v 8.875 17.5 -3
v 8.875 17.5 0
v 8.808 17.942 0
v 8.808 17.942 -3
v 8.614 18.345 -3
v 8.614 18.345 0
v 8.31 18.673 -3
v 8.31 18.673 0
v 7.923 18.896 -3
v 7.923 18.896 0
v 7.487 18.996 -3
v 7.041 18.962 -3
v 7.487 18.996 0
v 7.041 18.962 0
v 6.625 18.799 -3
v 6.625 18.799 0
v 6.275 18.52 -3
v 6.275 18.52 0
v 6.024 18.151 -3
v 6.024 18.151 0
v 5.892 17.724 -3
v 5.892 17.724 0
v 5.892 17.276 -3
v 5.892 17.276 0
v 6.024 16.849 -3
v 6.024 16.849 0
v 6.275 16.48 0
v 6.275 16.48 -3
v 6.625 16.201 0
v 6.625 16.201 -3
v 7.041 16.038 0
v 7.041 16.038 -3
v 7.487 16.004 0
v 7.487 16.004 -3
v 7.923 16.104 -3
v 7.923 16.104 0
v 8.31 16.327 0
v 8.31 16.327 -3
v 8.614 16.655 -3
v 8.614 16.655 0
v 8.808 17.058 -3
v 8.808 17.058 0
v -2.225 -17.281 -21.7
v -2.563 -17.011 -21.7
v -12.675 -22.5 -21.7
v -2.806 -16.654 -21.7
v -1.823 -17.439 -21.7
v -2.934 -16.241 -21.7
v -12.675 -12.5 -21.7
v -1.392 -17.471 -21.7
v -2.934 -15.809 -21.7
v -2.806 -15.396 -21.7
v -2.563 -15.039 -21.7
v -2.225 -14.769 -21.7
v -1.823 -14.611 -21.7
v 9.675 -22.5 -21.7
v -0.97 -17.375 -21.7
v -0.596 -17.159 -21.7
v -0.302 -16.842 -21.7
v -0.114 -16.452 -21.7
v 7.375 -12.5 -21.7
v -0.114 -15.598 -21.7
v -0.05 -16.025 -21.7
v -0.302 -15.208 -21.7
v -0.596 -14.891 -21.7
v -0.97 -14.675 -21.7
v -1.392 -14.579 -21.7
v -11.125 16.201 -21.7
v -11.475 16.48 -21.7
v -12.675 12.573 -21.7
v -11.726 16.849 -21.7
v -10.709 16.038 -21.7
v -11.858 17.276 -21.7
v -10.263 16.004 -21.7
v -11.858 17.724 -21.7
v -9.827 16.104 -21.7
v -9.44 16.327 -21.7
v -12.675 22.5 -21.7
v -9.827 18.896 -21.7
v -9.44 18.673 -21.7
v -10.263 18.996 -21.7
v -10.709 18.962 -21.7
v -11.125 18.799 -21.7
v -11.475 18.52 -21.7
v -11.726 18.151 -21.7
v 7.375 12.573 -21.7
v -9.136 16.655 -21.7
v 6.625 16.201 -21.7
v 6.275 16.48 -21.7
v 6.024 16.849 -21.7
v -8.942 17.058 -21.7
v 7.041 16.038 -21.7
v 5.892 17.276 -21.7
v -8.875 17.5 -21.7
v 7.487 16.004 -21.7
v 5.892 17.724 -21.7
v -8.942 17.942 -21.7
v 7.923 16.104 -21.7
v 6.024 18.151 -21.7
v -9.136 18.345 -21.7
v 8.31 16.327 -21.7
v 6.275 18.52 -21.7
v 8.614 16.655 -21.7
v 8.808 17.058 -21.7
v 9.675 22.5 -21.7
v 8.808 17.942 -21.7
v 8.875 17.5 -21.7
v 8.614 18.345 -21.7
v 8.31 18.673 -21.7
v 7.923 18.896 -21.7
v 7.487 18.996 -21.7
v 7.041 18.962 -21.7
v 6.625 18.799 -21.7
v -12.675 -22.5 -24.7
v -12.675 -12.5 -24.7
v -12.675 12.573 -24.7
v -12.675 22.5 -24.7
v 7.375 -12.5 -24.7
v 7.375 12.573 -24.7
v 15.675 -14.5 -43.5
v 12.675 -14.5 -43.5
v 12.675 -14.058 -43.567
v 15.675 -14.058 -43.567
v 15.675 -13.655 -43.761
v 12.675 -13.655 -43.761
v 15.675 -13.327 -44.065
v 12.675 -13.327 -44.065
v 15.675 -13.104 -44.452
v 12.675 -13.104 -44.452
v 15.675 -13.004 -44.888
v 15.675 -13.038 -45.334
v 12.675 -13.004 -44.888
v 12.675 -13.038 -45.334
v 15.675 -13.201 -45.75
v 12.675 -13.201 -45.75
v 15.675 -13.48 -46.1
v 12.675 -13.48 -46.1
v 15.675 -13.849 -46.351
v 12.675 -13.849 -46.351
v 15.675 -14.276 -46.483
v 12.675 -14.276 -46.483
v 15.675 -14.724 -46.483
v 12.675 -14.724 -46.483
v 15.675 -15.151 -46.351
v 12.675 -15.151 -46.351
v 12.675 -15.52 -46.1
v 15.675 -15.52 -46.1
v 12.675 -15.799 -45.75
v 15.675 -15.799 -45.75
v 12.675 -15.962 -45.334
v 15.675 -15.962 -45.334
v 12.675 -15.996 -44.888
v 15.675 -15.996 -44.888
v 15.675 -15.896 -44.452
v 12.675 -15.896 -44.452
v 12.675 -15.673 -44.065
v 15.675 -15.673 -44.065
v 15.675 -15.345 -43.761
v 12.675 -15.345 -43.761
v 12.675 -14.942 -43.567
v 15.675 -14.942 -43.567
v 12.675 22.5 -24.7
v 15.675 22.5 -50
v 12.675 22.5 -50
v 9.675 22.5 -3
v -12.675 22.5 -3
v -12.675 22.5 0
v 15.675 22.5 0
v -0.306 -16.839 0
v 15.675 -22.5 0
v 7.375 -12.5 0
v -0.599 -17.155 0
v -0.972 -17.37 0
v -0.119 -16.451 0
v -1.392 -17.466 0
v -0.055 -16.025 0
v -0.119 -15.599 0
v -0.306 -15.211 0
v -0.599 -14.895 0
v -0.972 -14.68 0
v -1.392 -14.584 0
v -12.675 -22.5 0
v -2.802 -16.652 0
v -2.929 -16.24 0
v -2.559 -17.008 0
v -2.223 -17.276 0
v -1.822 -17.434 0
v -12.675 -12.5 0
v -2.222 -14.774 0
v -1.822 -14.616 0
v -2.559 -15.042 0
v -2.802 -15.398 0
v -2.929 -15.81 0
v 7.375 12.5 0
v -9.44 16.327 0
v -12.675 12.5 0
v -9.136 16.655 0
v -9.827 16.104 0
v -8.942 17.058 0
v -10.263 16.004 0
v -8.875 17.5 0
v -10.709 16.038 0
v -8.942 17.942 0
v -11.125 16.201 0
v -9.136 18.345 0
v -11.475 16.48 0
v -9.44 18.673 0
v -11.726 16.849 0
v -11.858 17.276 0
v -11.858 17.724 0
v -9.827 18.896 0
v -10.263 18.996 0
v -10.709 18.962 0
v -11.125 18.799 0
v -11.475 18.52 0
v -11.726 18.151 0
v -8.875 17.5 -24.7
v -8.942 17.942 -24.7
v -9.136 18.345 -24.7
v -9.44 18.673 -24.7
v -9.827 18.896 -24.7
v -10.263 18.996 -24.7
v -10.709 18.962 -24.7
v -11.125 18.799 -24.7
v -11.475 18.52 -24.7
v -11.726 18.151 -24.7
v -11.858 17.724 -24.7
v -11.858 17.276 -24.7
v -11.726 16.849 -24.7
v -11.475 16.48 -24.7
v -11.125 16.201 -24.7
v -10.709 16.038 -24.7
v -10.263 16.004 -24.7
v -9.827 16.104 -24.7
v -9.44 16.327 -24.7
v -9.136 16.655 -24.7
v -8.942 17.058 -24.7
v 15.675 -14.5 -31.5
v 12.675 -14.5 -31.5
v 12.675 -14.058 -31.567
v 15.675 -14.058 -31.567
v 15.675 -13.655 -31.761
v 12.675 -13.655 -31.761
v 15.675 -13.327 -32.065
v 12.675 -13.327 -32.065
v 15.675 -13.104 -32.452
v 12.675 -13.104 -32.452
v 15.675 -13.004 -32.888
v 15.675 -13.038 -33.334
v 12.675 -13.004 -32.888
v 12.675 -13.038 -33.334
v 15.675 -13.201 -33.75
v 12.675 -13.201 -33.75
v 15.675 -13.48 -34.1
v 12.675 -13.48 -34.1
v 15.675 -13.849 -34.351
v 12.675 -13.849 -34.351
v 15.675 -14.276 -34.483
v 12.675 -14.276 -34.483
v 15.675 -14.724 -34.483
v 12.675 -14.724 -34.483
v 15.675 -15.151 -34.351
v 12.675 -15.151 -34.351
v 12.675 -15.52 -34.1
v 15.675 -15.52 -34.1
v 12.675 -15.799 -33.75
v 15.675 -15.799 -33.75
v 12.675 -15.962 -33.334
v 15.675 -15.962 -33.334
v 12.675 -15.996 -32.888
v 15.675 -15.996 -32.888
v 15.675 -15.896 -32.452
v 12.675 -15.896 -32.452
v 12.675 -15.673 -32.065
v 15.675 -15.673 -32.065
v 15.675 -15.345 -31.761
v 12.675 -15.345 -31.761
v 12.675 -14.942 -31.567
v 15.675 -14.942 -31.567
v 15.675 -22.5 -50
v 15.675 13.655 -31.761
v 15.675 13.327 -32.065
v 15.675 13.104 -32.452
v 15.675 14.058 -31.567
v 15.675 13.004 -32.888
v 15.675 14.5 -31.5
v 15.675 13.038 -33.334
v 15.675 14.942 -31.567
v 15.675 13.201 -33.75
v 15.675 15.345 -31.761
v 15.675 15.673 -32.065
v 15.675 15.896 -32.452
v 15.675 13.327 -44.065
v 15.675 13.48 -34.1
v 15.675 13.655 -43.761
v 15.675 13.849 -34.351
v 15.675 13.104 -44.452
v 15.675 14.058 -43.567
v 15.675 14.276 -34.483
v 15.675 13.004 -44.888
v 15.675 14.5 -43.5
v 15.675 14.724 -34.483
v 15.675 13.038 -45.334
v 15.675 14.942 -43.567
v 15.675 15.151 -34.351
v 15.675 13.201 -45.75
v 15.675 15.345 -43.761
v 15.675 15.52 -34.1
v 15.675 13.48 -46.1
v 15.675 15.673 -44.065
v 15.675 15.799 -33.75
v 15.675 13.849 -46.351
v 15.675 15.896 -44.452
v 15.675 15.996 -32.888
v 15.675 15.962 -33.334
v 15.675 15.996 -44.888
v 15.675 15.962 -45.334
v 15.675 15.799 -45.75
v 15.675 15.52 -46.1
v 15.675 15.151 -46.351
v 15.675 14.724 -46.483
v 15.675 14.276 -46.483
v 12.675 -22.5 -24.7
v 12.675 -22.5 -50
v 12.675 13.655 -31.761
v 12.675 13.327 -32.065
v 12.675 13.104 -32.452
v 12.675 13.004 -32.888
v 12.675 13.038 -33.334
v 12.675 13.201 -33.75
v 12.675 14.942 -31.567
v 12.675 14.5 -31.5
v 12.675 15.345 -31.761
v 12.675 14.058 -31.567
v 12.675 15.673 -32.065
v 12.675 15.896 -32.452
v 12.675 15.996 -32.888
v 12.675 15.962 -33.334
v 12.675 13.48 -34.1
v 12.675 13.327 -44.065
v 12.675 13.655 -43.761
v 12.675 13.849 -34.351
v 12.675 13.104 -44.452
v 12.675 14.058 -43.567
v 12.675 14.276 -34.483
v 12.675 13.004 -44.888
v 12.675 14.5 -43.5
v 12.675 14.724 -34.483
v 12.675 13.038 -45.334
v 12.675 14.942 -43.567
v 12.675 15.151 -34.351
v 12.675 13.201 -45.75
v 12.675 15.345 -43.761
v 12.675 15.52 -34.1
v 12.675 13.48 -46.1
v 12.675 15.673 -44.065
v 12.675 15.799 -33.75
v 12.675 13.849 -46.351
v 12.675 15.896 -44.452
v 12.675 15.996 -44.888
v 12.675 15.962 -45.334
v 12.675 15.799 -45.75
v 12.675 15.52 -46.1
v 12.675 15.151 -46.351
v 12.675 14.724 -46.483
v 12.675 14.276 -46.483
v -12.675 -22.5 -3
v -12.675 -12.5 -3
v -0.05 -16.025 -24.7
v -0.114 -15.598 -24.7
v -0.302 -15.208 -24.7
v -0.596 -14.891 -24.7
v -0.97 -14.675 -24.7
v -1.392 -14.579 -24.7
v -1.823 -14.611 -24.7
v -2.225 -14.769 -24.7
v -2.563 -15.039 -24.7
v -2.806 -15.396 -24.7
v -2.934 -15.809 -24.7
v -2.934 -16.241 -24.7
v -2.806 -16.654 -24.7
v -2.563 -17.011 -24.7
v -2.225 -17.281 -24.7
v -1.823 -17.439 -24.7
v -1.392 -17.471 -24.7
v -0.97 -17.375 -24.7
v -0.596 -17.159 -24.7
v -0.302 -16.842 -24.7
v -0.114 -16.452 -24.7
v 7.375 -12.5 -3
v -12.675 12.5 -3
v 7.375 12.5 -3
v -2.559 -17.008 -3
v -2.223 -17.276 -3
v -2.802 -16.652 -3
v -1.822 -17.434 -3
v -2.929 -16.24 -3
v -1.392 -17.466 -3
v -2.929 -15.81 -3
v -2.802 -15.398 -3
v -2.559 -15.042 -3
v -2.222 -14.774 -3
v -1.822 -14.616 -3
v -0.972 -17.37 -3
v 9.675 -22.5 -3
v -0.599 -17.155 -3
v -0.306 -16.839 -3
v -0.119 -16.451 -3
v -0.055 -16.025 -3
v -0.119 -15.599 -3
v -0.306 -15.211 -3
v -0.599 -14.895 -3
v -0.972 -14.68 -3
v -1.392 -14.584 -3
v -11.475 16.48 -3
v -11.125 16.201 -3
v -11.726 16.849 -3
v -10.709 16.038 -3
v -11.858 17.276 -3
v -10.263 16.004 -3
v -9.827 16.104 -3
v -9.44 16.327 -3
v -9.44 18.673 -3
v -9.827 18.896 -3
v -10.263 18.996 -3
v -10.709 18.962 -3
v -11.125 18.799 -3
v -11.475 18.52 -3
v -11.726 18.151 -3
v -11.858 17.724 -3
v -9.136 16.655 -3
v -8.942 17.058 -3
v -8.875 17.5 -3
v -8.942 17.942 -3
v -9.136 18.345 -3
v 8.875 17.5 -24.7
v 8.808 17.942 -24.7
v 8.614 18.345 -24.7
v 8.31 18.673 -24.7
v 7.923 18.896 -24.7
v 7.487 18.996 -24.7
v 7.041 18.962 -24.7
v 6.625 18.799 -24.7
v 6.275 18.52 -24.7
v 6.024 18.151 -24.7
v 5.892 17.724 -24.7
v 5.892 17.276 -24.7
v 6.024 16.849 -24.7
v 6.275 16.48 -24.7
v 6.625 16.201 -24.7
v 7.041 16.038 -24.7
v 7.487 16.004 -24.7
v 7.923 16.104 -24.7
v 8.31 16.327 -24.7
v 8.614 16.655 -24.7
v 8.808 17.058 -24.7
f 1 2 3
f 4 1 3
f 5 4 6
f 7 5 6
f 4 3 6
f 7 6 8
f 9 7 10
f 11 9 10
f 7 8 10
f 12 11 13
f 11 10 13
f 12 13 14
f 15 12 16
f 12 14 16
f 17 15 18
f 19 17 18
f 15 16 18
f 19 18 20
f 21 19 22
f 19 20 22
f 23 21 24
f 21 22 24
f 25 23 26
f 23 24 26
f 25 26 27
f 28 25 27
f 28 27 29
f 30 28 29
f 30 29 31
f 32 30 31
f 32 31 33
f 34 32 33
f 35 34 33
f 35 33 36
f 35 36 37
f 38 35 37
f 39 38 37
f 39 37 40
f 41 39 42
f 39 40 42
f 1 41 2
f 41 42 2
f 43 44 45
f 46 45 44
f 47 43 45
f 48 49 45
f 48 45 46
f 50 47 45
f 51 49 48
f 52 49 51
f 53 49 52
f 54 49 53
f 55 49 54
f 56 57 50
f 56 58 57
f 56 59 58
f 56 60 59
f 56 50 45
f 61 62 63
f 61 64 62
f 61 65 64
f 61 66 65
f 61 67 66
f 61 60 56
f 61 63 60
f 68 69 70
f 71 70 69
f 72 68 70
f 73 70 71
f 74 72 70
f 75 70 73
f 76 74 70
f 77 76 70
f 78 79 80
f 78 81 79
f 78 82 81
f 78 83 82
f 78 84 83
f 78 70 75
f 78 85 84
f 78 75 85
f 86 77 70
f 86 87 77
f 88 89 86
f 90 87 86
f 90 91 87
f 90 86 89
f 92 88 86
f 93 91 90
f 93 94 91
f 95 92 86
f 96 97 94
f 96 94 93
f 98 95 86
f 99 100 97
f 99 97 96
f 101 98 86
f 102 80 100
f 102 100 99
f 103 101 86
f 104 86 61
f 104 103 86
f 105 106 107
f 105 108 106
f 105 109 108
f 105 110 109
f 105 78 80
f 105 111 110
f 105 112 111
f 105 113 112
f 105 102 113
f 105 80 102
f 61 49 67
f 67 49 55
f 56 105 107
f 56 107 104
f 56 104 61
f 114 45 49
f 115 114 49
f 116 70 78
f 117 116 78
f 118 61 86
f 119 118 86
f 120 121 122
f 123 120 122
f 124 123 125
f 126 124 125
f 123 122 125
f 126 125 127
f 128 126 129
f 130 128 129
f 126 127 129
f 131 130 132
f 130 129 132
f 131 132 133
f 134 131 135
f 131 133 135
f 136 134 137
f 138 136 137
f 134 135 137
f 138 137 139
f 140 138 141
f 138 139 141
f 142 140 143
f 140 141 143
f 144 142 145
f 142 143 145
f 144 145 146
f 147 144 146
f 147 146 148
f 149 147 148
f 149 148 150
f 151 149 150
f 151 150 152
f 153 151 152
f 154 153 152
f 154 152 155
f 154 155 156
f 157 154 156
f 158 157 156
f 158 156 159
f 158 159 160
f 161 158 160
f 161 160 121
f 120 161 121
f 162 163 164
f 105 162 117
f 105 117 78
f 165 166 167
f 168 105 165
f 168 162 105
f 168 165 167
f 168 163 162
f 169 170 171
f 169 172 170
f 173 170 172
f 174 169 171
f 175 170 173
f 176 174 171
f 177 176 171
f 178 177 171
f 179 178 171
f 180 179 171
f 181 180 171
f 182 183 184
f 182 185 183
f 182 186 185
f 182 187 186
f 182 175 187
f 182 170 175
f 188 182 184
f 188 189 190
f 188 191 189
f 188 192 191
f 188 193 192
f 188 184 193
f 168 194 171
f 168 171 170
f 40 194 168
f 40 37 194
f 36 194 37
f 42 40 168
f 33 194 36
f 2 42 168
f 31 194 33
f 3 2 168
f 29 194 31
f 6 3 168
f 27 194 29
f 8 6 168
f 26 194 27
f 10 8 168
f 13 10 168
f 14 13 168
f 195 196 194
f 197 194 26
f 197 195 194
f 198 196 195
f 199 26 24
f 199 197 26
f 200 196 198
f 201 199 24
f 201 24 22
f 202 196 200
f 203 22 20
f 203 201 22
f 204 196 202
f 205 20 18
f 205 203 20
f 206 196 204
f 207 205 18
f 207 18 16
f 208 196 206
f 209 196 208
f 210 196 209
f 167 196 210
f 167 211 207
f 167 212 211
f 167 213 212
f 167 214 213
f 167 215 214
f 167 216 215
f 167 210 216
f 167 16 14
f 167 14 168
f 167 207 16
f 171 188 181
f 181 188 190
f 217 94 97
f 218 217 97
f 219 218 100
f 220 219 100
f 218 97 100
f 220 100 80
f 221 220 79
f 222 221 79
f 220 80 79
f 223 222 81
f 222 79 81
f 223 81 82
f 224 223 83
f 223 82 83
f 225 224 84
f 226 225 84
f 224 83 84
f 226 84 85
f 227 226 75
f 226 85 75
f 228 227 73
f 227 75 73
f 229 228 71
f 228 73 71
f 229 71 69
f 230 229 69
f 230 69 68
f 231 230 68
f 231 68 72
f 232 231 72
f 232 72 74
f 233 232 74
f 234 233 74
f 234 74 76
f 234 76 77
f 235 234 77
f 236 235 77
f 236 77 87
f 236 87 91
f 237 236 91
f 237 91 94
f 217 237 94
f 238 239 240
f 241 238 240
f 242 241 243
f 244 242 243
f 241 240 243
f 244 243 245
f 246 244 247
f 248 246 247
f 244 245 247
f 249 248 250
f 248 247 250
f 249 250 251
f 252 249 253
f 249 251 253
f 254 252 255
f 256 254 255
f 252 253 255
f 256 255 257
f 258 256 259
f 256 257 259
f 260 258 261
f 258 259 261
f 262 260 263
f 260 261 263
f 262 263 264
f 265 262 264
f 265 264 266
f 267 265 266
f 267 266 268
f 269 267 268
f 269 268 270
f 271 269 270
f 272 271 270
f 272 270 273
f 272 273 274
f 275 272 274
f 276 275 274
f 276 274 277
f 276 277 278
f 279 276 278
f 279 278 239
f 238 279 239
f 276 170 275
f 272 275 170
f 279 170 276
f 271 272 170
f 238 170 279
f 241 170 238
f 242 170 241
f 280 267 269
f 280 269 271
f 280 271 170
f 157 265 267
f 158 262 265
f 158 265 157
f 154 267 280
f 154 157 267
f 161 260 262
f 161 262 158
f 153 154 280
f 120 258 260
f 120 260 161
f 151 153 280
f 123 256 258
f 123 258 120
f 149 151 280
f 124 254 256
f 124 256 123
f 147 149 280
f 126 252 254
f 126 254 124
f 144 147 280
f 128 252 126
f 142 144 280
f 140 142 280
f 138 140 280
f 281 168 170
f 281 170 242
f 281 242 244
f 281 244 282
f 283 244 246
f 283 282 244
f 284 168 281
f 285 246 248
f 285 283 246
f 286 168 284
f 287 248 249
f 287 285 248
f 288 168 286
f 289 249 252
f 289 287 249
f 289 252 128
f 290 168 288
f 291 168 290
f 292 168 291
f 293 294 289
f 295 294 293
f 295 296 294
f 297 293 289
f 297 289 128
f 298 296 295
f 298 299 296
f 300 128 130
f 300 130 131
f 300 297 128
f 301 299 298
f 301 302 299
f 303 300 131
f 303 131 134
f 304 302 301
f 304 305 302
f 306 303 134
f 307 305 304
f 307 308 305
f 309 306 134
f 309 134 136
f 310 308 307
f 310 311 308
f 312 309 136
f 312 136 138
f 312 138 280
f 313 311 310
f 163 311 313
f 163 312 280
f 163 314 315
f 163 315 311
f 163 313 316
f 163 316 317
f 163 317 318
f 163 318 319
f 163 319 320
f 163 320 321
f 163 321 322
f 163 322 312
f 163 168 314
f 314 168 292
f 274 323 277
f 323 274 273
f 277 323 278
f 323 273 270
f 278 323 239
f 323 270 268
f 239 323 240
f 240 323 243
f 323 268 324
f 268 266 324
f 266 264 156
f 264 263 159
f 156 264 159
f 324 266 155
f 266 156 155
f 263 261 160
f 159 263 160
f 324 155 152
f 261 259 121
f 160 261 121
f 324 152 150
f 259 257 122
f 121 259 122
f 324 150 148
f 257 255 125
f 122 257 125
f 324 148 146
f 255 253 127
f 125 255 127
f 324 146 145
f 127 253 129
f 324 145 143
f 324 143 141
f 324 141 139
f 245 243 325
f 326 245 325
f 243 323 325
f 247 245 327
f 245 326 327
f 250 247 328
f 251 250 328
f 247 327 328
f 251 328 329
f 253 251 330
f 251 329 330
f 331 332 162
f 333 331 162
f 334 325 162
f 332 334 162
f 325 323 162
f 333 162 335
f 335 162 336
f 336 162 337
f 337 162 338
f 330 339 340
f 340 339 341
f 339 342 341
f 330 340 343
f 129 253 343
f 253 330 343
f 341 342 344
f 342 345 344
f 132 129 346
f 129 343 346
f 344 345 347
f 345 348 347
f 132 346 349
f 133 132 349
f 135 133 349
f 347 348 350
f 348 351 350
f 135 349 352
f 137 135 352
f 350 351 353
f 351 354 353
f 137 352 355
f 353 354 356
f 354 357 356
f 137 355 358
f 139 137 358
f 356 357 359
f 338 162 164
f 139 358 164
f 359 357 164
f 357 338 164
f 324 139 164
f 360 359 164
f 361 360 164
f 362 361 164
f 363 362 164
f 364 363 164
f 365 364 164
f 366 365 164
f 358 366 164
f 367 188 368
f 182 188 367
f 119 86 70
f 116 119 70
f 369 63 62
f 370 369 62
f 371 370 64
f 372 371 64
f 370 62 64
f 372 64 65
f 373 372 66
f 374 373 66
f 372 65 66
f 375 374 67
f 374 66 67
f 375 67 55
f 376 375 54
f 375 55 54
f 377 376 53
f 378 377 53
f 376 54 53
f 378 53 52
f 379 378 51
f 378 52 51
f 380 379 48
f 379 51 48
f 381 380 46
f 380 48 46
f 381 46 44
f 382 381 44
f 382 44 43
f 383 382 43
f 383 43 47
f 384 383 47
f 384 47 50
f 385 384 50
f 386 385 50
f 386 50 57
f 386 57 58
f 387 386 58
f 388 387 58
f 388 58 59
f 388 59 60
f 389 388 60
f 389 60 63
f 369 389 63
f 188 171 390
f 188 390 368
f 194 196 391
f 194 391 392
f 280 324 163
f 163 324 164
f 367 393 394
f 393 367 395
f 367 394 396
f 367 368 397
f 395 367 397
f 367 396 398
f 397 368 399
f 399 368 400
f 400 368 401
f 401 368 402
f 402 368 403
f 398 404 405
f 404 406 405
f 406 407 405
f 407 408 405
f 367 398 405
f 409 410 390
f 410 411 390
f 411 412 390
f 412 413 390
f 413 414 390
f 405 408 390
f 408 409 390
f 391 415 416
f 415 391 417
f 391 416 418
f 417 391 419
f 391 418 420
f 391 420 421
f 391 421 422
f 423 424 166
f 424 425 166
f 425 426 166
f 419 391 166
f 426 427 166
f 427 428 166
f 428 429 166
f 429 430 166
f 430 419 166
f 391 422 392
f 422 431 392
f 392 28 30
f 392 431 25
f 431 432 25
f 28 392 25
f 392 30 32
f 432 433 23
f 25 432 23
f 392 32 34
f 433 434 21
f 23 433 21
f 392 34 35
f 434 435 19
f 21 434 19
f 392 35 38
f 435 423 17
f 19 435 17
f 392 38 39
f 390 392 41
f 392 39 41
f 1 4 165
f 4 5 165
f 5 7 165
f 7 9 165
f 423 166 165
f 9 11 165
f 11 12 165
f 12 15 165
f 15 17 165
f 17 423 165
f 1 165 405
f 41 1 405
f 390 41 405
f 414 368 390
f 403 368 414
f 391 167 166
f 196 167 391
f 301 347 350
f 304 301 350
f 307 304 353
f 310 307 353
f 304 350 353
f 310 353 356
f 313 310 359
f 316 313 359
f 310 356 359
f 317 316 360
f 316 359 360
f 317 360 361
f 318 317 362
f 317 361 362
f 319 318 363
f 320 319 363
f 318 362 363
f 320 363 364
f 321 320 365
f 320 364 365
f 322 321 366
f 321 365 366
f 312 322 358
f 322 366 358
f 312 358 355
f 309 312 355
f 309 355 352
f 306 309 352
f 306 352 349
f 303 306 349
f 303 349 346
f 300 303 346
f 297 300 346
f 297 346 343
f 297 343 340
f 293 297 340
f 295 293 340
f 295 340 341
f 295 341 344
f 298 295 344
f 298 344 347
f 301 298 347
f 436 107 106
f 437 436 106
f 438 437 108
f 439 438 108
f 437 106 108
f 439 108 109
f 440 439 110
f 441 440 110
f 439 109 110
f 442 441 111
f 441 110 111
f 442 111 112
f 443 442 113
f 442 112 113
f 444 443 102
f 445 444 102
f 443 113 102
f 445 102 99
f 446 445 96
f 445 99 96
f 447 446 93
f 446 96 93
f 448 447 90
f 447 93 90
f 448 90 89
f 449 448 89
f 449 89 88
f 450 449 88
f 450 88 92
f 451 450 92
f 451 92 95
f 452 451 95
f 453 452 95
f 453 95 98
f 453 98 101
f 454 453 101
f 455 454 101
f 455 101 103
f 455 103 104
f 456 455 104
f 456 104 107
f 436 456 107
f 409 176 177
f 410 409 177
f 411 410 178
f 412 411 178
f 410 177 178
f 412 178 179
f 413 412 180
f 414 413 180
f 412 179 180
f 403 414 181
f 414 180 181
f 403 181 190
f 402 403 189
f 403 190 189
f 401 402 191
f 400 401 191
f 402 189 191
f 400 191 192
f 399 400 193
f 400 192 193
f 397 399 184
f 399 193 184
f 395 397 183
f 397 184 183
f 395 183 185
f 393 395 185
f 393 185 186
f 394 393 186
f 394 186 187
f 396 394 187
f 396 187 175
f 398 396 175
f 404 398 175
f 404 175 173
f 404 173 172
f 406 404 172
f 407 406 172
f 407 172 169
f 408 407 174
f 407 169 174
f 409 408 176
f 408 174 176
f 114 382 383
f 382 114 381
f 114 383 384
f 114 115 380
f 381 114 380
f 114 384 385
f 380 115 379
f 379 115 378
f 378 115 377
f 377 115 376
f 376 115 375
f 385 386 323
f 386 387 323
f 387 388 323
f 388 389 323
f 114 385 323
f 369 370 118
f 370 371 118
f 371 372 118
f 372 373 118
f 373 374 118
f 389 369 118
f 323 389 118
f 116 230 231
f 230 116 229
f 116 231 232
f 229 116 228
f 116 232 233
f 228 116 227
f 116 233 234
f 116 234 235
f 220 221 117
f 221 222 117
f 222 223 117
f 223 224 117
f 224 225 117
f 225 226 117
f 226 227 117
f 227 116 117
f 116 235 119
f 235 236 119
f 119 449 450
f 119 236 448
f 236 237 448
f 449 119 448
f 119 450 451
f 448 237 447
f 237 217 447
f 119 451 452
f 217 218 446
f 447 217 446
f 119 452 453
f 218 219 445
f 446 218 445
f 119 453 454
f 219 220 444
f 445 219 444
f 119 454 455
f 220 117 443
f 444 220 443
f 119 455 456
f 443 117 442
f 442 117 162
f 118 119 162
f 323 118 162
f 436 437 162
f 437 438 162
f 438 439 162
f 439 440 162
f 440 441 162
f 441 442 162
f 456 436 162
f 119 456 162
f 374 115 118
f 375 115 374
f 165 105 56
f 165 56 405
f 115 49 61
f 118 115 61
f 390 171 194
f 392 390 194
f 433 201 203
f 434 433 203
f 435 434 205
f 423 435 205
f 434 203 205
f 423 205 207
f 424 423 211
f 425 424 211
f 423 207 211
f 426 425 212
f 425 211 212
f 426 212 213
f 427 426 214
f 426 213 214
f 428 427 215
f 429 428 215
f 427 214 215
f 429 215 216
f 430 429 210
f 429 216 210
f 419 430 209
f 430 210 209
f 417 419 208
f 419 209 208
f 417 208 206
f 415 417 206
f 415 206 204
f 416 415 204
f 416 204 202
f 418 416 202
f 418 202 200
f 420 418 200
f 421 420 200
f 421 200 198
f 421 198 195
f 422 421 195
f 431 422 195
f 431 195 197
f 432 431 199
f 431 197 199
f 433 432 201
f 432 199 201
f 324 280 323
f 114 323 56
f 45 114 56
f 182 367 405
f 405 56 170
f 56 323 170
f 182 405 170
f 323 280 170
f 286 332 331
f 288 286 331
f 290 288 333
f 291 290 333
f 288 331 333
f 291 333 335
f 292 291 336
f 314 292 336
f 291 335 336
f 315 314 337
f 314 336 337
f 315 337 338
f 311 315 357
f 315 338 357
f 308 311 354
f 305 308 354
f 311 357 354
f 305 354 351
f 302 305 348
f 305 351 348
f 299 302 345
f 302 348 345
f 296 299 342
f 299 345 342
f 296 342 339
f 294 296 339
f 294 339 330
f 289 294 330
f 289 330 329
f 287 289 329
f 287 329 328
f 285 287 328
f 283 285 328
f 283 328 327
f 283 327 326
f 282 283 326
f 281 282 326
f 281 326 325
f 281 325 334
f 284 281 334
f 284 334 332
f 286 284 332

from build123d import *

# Parameters (mm, degrees)
SKETCH2_W           = 5.3
SKETCH2_H           = 25
SKETCH2_R           = 1.5
SKETCH2_R_2         = 1.445
BOSS_EXTRUDE1_DEPTH = 3
SKETCH3_W           = 50
SKETCH3_H           = 45
BOSS_EXTRUDE2_DEPTH = 3
SKETCH7_W           = 38.35
SKETCH7_H           = 3
BOSS_EXTRUDE3_DEPTH = 45
CUT_EXTRUDE1_DEPTH  = 5
SKETCH14_R          = 1.5
SKETCH14_R_2        = 1.45
CUT_EXTRUDE5_DEPTH  = 5
SKETCH15_R          = 1.5
CUT_EXTRUDE6_DEPTH  = 5
SKETCH12_W          = 18.7
SKETCH12_H          = 45
BOSS_EXTRUDE4_DEPTH = 3


with BuildPart() as part:
    # Sketch2 → Boss-Extrude1 (new body)
    # profile 1 of 3: a face of its own
    with BuildSketch(Plane.XY):
        with Locations((10.025, 0)):
            Rectangle(SKETCH2_W, SKETCH2_H)
    # profile 2 of 3: a face of its own
    with BuildSketch(Plane.XY):
        Polygon((7.375, 12.5), (12.675, 12.5), (12.675, 22.5), (-12.675, 22.5), (-12.675, 12.5), align=None)
        with Locations((-10.375, 17.5)):
            Circle(SKETCH2_R, mode=Mode.SUBTRACT)
        with Locations((7.375, 17.5)):
            Circle(SKETCH2_R, mode=Mode.SUBTRACT)
    # profile 3 of 3: a face of its own
    with BuildSketch(Plane.XY):
        Polygon((-12.675, -22.5), (12.675, -22.5), (12.675, -12.5), (7.375, -12.5), (-12.675, -12.5), align=None)
        with Locations((-1.5, -16.025)):
            Circle(SKETCH2_R_2, mode=Mode.SUBTRACT)
    extrude(amount=-BOSS_EXTRUDE1_DEPTH)

    # Sketch3 → Boss-Extrude2 (add)
    with BuildSketch(Plane(origin=(12.675, 0, 0), x_dir=(0, 0, -1), z_dir=(1, 0, 0))):
        with Locations((25, 0)):
            Rectangle(SKETCH3_W, SKETCH3_H)
    extrude(amount=BOSS_EXTRUDE2_DEPTH)

    # Sketch7 → Boss-Extrude3 (add)
    with BuildSketch(Plane(origin=(0, 22.5, 0), x_dir=(1, 0, 0), z_dir=(0, 1, 0))):
        with Locations((-3.5, 23.2)):
            Rectangle(SKETCH7_W, SKETCH7_H)
    extrude(amount=-BOSS_EXTRUDE3_DEPTH)

    # Sketch8 → Cut-Extrude1 (cut)
    with BuildSketch(Plane.XY.offset(-21.7)):
        Polygon((-12.675, 12.572802409), (-12.675, 22.5), (-22.675, 22.5), (-22.675, -22.5), (-12.675, -22.5), (-12.675, -12.5), (7.375, -12.5), (7.375, 12.572802409), align=None)
    extrude(amount=-CUT_EXTRUDE1_DEPTH, mode=Mode.SUBTRACT)

    # Sketch14 → Cut-Extrude5 (cut)
    with BuildSketch(Plane.XY.offset(-21.7)):
        with Locations((-10.375, 17.5)):
            Circle(SKETCH14_R)
        with Locations((7.375, 17.5)):
            Circle(SKETCH14_R)
        with Locations((-1.5, -16.025)):
            Circle(SKETCH14_R_2)
    extrude(amount=-CUT_EXTRUDE5_DEPTH, mode=Mode.SUBTRACT)

    # Sketch15 → Cut-Extrude6 (cut)
    with BuildSketch(Plane.ZY.offset(-12.675)):
        with Locations((-33, 14.5)):
            Circle(SKETCH15_R)
        with Locations((-33, -14.5)):
            Circle(SKETCH15_R)
        with Locations((-45, 14.5)):
            Circle(SKETCH15_R)
        with Locations((-45, -14.5)):
            Circle(SKETCH15_R)
    extrude(amount=-CUT_EXTRUDE6_DEPTH, mode=Mode.SUBTRACT)

    # Sketch12 → Boss-Extrude4 (add)
    with BuildSketch(Plane.ZY.offset(-12.675)):
        with Locations((-12.35, 0)):
            Rectangle(SKETCH12_W, SKETCH12_H)
    extrude(amount=BOSS_EXTRUDE4_DEPTH)


solid = part.part
